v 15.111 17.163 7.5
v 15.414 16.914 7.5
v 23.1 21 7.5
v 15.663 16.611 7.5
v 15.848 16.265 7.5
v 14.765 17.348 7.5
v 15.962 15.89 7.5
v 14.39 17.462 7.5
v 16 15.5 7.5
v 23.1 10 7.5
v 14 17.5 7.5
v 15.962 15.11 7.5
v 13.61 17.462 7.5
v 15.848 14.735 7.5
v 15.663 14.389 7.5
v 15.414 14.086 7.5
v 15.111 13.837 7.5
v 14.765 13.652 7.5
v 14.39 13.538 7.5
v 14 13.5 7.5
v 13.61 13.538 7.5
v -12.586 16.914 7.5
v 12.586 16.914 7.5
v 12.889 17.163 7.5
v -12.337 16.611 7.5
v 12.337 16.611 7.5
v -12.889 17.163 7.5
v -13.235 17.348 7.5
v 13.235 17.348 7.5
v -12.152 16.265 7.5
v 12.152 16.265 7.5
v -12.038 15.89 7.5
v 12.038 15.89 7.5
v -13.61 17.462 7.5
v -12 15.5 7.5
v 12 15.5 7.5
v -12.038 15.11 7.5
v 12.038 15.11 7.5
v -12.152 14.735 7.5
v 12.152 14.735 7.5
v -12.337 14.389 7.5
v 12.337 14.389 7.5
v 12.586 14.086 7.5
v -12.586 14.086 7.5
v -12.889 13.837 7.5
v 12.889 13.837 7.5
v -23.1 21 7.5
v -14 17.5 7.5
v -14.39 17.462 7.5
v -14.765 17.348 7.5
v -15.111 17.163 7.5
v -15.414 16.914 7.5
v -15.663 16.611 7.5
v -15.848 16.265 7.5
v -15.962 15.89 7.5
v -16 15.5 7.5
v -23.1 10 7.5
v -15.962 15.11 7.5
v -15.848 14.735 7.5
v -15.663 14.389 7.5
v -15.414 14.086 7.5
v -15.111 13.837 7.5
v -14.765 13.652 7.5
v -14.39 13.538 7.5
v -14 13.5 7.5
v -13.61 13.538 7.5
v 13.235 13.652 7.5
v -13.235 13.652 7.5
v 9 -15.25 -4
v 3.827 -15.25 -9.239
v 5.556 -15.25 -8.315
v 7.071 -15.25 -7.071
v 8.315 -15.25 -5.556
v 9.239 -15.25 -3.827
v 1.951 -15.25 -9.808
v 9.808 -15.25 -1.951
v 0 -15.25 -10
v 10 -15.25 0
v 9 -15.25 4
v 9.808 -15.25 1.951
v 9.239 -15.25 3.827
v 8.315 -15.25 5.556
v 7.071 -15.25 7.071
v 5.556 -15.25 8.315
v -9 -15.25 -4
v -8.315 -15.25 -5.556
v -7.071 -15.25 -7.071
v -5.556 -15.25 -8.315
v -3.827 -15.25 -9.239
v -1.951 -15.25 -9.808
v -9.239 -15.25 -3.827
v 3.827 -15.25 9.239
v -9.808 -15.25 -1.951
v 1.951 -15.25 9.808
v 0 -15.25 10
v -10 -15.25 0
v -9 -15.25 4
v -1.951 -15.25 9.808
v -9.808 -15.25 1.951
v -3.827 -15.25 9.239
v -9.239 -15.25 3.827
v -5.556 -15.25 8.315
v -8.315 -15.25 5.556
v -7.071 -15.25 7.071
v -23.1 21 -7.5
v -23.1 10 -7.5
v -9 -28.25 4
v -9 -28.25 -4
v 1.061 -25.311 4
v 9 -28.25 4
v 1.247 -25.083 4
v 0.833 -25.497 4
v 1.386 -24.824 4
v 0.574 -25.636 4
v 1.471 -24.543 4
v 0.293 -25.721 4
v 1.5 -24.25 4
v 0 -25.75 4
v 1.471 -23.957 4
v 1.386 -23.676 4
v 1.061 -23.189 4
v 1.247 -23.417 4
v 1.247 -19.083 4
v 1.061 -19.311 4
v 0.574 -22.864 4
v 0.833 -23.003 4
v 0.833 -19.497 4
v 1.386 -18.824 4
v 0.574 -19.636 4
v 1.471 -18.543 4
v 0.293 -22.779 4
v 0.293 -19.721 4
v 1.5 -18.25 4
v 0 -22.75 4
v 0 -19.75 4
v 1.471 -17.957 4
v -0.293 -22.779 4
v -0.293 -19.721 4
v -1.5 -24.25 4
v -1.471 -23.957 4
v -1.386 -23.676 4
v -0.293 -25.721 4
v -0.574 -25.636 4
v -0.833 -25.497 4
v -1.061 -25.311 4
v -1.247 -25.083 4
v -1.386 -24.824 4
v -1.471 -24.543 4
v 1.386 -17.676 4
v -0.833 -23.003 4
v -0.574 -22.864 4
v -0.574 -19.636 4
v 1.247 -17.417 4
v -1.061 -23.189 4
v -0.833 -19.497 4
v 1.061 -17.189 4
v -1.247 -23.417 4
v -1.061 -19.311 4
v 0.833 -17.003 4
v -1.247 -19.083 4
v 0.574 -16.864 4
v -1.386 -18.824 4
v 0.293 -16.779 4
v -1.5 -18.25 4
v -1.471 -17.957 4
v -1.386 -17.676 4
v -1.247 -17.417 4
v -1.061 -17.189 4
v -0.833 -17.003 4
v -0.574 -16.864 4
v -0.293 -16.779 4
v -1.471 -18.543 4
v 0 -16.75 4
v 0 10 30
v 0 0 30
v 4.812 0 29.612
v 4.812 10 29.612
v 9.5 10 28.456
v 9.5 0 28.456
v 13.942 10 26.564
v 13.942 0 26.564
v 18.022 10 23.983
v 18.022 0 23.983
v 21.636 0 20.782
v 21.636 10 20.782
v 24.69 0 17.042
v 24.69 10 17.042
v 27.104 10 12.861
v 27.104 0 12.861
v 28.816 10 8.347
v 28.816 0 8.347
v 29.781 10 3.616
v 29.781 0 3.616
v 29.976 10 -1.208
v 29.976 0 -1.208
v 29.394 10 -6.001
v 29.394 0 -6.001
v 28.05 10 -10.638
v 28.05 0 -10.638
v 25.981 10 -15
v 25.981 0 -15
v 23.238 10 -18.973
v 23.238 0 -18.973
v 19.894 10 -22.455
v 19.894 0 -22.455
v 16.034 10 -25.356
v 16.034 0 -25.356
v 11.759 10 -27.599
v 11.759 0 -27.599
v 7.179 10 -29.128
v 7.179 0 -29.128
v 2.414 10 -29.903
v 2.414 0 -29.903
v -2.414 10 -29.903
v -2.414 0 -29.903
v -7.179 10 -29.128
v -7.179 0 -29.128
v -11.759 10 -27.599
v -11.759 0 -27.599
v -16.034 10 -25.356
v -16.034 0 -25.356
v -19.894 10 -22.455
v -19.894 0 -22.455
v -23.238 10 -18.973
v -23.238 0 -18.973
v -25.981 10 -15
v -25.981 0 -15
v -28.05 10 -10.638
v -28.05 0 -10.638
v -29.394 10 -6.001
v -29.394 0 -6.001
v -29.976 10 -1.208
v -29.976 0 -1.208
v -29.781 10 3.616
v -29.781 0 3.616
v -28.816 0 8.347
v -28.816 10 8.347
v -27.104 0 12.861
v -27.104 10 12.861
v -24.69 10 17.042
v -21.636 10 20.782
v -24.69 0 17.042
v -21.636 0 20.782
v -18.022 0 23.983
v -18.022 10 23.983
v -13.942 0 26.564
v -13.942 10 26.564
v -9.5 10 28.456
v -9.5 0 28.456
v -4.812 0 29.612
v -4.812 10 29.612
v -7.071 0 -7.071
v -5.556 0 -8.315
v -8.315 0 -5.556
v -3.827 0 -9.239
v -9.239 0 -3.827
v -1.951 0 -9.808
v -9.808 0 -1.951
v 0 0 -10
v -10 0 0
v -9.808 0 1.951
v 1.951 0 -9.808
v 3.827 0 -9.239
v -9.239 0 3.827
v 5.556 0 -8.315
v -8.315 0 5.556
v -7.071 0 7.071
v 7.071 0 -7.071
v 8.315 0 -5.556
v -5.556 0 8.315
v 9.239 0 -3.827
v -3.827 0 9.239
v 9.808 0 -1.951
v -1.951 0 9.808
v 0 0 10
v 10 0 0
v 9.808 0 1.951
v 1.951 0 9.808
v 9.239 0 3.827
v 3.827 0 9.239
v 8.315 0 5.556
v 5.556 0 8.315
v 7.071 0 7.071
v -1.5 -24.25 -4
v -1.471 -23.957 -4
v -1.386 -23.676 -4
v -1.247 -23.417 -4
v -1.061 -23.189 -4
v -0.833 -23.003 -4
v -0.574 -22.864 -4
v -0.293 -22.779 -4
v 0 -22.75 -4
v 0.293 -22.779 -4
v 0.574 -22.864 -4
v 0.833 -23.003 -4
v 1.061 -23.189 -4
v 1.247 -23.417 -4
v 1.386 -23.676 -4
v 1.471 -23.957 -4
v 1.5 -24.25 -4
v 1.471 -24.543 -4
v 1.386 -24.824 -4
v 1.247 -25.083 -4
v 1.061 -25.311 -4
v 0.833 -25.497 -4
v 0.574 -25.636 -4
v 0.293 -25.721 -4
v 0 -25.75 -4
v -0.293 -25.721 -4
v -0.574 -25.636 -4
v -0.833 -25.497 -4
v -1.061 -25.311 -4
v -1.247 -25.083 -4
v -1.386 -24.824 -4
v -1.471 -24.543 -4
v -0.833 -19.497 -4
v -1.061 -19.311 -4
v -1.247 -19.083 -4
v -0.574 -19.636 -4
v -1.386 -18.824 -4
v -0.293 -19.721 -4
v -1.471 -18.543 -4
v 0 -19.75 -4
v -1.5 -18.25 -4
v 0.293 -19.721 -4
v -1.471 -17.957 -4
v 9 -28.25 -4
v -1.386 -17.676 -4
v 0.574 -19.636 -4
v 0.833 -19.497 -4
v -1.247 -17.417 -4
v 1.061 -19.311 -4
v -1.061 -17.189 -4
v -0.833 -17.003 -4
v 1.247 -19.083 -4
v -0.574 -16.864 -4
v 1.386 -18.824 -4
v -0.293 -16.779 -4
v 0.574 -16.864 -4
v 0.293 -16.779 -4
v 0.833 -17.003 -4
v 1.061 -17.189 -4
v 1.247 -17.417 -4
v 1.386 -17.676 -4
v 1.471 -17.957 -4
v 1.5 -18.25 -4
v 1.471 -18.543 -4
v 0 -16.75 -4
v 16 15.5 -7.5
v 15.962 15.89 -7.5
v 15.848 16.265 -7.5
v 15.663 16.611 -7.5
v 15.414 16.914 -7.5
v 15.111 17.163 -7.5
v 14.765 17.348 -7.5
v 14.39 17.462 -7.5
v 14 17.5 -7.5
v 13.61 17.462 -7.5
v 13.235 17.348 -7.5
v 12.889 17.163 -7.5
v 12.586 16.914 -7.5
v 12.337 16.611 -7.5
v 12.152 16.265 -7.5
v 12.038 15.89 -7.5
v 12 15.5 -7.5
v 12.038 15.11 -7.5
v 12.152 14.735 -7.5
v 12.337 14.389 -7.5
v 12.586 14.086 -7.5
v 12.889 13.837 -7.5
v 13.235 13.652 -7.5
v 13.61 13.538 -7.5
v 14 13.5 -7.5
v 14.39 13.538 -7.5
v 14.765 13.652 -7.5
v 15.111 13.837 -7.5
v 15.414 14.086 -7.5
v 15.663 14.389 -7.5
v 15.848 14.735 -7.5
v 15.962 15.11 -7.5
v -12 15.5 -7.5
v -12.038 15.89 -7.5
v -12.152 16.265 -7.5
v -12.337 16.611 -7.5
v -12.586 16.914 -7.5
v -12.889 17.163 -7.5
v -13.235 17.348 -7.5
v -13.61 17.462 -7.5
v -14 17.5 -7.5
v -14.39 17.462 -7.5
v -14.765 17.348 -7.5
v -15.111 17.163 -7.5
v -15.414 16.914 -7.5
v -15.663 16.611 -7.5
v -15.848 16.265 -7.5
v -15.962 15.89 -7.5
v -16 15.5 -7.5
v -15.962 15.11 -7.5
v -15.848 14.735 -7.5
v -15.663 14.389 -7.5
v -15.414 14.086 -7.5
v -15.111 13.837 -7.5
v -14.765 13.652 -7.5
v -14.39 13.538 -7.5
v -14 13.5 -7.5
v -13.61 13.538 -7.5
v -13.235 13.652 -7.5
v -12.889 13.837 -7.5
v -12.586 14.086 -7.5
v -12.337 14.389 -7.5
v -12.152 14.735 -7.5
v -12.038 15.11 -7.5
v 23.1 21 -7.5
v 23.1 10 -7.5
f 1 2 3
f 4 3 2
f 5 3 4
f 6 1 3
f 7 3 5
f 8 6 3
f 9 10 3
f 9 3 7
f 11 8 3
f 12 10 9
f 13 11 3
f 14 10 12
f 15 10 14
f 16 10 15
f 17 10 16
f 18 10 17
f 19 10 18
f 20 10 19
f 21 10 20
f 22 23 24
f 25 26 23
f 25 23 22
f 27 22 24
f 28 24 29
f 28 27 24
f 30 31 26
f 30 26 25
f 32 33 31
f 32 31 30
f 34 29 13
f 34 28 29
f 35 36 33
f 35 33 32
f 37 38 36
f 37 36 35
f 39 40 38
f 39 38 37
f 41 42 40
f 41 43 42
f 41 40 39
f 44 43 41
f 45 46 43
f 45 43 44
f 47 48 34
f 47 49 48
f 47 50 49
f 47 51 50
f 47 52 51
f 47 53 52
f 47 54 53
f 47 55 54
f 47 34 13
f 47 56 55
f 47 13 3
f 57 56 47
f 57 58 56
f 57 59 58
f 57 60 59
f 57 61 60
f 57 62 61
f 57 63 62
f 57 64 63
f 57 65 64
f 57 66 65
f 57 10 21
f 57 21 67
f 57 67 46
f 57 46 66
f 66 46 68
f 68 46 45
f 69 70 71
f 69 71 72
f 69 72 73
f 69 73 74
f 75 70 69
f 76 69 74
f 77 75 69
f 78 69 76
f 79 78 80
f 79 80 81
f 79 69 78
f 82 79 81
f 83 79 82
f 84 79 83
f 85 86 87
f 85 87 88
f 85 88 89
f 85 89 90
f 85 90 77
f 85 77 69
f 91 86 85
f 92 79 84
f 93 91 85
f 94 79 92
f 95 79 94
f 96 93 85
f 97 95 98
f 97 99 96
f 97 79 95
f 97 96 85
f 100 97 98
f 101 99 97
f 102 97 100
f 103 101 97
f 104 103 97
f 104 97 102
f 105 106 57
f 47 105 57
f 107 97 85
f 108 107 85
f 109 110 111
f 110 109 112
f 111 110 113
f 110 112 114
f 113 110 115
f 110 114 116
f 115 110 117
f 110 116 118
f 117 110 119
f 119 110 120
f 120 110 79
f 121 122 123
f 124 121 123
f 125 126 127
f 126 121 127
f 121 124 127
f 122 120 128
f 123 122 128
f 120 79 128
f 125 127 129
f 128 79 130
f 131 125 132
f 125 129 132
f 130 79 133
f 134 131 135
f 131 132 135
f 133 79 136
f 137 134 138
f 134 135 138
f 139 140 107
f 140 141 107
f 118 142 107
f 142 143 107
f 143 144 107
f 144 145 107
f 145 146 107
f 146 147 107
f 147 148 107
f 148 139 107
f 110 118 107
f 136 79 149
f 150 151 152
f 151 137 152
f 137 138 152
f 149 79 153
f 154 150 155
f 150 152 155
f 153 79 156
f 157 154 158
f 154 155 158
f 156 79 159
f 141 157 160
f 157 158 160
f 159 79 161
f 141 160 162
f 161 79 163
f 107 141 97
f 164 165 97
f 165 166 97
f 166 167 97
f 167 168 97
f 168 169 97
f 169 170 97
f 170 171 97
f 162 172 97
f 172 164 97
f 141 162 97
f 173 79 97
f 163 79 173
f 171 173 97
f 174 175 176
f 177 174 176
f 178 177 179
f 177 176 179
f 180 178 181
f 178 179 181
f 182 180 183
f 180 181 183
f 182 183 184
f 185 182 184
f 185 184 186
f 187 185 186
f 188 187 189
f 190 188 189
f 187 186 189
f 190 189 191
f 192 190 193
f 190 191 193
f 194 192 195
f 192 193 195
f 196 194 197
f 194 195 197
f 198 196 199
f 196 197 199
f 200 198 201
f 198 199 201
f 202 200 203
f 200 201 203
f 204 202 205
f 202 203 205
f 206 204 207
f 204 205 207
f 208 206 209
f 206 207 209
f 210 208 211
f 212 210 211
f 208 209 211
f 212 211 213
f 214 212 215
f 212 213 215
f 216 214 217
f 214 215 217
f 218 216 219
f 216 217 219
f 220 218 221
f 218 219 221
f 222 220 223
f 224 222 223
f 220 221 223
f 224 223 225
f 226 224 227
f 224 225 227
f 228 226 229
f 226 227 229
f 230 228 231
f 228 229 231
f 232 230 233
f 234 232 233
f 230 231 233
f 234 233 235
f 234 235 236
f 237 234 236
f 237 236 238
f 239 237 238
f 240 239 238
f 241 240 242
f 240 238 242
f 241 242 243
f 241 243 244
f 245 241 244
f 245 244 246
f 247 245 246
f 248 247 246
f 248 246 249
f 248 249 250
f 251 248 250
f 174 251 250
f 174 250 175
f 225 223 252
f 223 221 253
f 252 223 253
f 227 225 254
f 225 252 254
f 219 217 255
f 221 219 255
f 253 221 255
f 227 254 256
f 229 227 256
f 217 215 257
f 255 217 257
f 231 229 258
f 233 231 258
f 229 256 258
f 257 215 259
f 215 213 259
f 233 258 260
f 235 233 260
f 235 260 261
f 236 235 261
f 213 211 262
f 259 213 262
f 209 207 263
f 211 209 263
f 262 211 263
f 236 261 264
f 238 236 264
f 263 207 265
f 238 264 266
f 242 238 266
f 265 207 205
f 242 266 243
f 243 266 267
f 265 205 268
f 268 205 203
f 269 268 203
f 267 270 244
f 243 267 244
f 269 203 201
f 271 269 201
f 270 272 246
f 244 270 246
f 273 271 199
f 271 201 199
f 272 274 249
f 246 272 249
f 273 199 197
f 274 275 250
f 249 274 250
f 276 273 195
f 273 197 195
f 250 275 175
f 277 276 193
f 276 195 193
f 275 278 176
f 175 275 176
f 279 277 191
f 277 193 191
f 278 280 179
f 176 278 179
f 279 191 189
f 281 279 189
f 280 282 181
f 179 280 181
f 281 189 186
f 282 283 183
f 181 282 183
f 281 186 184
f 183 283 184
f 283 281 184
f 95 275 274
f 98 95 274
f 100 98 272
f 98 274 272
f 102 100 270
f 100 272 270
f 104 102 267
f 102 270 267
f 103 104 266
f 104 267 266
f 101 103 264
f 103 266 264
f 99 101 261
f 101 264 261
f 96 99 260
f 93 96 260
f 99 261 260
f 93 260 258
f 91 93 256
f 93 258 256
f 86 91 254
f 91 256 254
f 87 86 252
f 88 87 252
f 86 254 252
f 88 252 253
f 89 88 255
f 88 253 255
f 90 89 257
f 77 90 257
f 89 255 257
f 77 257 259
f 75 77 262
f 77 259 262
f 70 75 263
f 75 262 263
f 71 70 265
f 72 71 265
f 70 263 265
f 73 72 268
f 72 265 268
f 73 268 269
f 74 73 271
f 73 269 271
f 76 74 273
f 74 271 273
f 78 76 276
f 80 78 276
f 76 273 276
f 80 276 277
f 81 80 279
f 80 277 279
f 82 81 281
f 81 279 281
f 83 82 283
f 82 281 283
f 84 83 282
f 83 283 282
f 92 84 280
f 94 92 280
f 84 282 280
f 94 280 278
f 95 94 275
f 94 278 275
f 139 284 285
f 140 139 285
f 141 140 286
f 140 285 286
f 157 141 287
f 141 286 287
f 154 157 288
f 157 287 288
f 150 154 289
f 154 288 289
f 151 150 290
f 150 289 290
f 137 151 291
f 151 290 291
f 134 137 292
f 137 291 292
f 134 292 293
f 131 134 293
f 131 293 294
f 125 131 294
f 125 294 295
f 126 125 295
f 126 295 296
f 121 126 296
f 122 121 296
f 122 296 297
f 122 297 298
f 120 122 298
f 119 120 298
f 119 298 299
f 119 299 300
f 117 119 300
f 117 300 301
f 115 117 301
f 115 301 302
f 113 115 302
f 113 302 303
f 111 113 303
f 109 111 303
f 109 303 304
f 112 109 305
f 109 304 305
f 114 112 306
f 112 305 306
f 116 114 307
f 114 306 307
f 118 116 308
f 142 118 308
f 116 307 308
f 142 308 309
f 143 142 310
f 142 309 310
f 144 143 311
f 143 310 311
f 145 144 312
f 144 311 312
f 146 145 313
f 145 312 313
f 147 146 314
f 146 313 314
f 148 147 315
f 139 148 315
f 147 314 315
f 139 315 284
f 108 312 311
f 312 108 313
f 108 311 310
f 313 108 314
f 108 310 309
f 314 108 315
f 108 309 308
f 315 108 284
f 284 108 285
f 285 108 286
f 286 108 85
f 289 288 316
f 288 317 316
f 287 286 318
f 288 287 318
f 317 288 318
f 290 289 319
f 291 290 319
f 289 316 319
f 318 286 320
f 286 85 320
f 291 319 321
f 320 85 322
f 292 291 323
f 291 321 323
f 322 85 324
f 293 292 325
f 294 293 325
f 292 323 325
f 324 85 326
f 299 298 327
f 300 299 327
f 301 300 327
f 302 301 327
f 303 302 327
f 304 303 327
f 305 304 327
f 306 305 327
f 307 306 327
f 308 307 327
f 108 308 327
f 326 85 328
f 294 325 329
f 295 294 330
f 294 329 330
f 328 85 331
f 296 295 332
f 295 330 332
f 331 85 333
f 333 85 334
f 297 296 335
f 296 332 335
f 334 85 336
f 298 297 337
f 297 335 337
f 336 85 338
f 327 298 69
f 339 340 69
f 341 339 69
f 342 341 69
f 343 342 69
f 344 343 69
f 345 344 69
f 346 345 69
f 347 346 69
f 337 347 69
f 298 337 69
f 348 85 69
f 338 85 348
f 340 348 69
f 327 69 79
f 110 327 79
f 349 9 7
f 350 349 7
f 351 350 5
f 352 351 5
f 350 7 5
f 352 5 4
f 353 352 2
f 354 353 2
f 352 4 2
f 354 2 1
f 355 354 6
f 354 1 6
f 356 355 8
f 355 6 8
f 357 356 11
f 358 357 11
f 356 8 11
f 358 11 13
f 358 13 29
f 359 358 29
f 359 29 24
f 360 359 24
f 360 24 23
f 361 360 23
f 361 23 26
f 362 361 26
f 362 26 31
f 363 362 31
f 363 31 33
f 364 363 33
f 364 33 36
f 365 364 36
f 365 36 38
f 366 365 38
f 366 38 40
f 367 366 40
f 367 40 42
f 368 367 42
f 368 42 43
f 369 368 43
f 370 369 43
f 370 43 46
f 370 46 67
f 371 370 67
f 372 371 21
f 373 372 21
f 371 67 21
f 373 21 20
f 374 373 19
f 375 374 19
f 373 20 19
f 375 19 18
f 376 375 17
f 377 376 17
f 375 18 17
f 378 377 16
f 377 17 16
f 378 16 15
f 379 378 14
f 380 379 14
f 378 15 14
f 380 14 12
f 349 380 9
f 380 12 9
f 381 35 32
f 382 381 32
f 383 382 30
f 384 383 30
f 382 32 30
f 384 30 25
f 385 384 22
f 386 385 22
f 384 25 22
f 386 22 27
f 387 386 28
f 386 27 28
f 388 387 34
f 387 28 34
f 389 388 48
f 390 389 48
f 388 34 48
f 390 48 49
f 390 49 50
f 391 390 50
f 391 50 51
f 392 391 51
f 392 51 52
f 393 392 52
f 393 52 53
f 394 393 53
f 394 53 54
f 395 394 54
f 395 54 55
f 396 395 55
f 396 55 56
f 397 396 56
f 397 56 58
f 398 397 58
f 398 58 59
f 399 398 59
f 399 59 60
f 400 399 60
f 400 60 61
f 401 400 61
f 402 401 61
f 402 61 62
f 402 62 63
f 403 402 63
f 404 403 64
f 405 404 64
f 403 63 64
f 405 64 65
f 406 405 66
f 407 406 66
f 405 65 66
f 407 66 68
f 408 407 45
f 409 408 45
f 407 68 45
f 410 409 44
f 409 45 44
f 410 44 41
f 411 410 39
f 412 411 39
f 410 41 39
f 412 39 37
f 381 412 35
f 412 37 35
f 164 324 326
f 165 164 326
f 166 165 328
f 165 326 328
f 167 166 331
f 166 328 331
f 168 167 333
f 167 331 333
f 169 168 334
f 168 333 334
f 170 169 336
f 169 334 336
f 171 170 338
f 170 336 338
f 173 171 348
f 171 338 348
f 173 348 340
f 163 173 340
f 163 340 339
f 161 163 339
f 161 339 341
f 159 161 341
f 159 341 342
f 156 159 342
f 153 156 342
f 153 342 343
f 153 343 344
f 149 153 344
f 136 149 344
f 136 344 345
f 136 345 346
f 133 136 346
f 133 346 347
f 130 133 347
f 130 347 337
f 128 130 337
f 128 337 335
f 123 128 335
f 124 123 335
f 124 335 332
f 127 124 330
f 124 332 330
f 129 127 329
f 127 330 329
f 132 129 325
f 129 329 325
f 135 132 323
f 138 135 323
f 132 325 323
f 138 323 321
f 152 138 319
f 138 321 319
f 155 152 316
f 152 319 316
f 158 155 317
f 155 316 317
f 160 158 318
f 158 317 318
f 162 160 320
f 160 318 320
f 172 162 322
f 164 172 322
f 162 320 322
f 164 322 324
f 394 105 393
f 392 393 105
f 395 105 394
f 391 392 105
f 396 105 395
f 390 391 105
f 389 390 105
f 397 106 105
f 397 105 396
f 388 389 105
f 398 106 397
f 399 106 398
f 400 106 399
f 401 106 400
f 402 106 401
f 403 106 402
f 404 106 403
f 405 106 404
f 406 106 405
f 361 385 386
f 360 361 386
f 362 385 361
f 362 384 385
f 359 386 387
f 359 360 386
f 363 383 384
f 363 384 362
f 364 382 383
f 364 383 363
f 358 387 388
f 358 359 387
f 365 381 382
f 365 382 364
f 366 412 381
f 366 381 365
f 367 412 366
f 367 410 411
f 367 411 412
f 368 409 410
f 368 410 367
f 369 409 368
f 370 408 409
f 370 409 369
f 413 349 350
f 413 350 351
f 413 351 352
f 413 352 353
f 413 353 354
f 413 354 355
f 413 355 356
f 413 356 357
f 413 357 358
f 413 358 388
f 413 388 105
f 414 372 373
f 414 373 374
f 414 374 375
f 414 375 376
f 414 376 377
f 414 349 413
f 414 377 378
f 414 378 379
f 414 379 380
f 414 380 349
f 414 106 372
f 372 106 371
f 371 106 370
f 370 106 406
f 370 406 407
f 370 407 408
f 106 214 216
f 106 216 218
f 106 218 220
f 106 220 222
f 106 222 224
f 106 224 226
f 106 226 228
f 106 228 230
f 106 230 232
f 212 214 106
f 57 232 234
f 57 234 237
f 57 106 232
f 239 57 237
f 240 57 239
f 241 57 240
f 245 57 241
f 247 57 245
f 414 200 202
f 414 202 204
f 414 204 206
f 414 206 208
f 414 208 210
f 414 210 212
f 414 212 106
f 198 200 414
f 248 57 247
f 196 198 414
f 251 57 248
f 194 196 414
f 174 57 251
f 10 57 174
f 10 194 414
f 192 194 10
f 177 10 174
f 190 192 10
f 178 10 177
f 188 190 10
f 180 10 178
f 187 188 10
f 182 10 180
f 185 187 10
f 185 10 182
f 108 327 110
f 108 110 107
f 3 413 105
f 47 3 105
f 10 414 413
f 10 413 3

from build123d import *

# Parameters (mm, degrees)
SKETCH1_R                = 30
BOSS_EXTRUDE1_DEPTH      = 10
SKETCH2_R                = 10
BOSS_EXTRUDE2_DEPTH      = 15.25
BOSS_EXTRUDE3_DEPTH      = 13
F_3_0_3_DIAMETER_HOLE1_D = 3
BOSS_EXTRUDE4_DEPTH      = 11
F_4_0_4_DIAMETER_HOLE1_D = 4


with BuildPart() as part:
    # Sketch1 → Boss-Extrude1 (new body)
    with BuildSketch(Plane(origin=(0, 0, 0), x_dir=(1, 0, 0), z_dir=(0, 1, 0))):
        with Locations(Location((0, 0, 0), (0, 0, 270))):
            Circle(SKETCH1_R)
    extrude(amount=BOSS_EXTRUDE1_DEPTH)

    # Sketch2 → Boss-Extrude2 (add)
    with BuildSketch(Plane(origin=(0, 0, 0), x_dir=(-1, 0, 0), z_dir=(0, -1, 0))):
        with Locations(Location((0, 0, 0), (0, 0, 270))):
            Circle(SKETCH2_R)
    extrude(amount=BOSS_EXTRUDE2_DEPTH)

    # Sketch3 → Boss-Extrude3 (add)
    with BuildSketch(Plane(origin=(0, -15.25, 0), x_dir=(-1, 0, 0), z_dir=(0, -1, 0))):
        Polygon((-9, 4), (-9, 0), (-9, -4), (9, -4), (9, 4), align=None)
    extrude(amount=BOSS_EXTRUDE3_DEPTH)

    # Ø3.0 (3) Diameter Hole1 (through all)
    with Locations(Plane.XY.offset(4)):
        with Locations((0, -24.25), (0, -18.25)):
            Hole(F_3_0_3_DIAMETER_HOLE1_D / 2)

    # Sketch8 → Boss-Extrude4 (add)
    with BuildSketch(Plane(origin=(0, 10, 0), x_dir=(1, 0, 0), z_dir=(0, 1, 0))):
        Polygon((-23.1, -7.5), (-23.1, 0), (-23.1, 7.5), (23.1, 7.5), (23.1, -7.5), align=None)
    extrude(amount=BOSS_EXTRUDE4_DEPTH)

    # Ø4.0 (4) Diameter Hole1 (through all)
    with Locations(Plane(origin=(0, 0, -7.5), x_dir=(-1, 0, 0), z_dir=(0, 0, -1))):
        with Locations((-14, 15.5), (14, 15.5)):
            Hole(F_4_0_4_DIAMETER_HOLE1_D / 2)


solid = part.part
